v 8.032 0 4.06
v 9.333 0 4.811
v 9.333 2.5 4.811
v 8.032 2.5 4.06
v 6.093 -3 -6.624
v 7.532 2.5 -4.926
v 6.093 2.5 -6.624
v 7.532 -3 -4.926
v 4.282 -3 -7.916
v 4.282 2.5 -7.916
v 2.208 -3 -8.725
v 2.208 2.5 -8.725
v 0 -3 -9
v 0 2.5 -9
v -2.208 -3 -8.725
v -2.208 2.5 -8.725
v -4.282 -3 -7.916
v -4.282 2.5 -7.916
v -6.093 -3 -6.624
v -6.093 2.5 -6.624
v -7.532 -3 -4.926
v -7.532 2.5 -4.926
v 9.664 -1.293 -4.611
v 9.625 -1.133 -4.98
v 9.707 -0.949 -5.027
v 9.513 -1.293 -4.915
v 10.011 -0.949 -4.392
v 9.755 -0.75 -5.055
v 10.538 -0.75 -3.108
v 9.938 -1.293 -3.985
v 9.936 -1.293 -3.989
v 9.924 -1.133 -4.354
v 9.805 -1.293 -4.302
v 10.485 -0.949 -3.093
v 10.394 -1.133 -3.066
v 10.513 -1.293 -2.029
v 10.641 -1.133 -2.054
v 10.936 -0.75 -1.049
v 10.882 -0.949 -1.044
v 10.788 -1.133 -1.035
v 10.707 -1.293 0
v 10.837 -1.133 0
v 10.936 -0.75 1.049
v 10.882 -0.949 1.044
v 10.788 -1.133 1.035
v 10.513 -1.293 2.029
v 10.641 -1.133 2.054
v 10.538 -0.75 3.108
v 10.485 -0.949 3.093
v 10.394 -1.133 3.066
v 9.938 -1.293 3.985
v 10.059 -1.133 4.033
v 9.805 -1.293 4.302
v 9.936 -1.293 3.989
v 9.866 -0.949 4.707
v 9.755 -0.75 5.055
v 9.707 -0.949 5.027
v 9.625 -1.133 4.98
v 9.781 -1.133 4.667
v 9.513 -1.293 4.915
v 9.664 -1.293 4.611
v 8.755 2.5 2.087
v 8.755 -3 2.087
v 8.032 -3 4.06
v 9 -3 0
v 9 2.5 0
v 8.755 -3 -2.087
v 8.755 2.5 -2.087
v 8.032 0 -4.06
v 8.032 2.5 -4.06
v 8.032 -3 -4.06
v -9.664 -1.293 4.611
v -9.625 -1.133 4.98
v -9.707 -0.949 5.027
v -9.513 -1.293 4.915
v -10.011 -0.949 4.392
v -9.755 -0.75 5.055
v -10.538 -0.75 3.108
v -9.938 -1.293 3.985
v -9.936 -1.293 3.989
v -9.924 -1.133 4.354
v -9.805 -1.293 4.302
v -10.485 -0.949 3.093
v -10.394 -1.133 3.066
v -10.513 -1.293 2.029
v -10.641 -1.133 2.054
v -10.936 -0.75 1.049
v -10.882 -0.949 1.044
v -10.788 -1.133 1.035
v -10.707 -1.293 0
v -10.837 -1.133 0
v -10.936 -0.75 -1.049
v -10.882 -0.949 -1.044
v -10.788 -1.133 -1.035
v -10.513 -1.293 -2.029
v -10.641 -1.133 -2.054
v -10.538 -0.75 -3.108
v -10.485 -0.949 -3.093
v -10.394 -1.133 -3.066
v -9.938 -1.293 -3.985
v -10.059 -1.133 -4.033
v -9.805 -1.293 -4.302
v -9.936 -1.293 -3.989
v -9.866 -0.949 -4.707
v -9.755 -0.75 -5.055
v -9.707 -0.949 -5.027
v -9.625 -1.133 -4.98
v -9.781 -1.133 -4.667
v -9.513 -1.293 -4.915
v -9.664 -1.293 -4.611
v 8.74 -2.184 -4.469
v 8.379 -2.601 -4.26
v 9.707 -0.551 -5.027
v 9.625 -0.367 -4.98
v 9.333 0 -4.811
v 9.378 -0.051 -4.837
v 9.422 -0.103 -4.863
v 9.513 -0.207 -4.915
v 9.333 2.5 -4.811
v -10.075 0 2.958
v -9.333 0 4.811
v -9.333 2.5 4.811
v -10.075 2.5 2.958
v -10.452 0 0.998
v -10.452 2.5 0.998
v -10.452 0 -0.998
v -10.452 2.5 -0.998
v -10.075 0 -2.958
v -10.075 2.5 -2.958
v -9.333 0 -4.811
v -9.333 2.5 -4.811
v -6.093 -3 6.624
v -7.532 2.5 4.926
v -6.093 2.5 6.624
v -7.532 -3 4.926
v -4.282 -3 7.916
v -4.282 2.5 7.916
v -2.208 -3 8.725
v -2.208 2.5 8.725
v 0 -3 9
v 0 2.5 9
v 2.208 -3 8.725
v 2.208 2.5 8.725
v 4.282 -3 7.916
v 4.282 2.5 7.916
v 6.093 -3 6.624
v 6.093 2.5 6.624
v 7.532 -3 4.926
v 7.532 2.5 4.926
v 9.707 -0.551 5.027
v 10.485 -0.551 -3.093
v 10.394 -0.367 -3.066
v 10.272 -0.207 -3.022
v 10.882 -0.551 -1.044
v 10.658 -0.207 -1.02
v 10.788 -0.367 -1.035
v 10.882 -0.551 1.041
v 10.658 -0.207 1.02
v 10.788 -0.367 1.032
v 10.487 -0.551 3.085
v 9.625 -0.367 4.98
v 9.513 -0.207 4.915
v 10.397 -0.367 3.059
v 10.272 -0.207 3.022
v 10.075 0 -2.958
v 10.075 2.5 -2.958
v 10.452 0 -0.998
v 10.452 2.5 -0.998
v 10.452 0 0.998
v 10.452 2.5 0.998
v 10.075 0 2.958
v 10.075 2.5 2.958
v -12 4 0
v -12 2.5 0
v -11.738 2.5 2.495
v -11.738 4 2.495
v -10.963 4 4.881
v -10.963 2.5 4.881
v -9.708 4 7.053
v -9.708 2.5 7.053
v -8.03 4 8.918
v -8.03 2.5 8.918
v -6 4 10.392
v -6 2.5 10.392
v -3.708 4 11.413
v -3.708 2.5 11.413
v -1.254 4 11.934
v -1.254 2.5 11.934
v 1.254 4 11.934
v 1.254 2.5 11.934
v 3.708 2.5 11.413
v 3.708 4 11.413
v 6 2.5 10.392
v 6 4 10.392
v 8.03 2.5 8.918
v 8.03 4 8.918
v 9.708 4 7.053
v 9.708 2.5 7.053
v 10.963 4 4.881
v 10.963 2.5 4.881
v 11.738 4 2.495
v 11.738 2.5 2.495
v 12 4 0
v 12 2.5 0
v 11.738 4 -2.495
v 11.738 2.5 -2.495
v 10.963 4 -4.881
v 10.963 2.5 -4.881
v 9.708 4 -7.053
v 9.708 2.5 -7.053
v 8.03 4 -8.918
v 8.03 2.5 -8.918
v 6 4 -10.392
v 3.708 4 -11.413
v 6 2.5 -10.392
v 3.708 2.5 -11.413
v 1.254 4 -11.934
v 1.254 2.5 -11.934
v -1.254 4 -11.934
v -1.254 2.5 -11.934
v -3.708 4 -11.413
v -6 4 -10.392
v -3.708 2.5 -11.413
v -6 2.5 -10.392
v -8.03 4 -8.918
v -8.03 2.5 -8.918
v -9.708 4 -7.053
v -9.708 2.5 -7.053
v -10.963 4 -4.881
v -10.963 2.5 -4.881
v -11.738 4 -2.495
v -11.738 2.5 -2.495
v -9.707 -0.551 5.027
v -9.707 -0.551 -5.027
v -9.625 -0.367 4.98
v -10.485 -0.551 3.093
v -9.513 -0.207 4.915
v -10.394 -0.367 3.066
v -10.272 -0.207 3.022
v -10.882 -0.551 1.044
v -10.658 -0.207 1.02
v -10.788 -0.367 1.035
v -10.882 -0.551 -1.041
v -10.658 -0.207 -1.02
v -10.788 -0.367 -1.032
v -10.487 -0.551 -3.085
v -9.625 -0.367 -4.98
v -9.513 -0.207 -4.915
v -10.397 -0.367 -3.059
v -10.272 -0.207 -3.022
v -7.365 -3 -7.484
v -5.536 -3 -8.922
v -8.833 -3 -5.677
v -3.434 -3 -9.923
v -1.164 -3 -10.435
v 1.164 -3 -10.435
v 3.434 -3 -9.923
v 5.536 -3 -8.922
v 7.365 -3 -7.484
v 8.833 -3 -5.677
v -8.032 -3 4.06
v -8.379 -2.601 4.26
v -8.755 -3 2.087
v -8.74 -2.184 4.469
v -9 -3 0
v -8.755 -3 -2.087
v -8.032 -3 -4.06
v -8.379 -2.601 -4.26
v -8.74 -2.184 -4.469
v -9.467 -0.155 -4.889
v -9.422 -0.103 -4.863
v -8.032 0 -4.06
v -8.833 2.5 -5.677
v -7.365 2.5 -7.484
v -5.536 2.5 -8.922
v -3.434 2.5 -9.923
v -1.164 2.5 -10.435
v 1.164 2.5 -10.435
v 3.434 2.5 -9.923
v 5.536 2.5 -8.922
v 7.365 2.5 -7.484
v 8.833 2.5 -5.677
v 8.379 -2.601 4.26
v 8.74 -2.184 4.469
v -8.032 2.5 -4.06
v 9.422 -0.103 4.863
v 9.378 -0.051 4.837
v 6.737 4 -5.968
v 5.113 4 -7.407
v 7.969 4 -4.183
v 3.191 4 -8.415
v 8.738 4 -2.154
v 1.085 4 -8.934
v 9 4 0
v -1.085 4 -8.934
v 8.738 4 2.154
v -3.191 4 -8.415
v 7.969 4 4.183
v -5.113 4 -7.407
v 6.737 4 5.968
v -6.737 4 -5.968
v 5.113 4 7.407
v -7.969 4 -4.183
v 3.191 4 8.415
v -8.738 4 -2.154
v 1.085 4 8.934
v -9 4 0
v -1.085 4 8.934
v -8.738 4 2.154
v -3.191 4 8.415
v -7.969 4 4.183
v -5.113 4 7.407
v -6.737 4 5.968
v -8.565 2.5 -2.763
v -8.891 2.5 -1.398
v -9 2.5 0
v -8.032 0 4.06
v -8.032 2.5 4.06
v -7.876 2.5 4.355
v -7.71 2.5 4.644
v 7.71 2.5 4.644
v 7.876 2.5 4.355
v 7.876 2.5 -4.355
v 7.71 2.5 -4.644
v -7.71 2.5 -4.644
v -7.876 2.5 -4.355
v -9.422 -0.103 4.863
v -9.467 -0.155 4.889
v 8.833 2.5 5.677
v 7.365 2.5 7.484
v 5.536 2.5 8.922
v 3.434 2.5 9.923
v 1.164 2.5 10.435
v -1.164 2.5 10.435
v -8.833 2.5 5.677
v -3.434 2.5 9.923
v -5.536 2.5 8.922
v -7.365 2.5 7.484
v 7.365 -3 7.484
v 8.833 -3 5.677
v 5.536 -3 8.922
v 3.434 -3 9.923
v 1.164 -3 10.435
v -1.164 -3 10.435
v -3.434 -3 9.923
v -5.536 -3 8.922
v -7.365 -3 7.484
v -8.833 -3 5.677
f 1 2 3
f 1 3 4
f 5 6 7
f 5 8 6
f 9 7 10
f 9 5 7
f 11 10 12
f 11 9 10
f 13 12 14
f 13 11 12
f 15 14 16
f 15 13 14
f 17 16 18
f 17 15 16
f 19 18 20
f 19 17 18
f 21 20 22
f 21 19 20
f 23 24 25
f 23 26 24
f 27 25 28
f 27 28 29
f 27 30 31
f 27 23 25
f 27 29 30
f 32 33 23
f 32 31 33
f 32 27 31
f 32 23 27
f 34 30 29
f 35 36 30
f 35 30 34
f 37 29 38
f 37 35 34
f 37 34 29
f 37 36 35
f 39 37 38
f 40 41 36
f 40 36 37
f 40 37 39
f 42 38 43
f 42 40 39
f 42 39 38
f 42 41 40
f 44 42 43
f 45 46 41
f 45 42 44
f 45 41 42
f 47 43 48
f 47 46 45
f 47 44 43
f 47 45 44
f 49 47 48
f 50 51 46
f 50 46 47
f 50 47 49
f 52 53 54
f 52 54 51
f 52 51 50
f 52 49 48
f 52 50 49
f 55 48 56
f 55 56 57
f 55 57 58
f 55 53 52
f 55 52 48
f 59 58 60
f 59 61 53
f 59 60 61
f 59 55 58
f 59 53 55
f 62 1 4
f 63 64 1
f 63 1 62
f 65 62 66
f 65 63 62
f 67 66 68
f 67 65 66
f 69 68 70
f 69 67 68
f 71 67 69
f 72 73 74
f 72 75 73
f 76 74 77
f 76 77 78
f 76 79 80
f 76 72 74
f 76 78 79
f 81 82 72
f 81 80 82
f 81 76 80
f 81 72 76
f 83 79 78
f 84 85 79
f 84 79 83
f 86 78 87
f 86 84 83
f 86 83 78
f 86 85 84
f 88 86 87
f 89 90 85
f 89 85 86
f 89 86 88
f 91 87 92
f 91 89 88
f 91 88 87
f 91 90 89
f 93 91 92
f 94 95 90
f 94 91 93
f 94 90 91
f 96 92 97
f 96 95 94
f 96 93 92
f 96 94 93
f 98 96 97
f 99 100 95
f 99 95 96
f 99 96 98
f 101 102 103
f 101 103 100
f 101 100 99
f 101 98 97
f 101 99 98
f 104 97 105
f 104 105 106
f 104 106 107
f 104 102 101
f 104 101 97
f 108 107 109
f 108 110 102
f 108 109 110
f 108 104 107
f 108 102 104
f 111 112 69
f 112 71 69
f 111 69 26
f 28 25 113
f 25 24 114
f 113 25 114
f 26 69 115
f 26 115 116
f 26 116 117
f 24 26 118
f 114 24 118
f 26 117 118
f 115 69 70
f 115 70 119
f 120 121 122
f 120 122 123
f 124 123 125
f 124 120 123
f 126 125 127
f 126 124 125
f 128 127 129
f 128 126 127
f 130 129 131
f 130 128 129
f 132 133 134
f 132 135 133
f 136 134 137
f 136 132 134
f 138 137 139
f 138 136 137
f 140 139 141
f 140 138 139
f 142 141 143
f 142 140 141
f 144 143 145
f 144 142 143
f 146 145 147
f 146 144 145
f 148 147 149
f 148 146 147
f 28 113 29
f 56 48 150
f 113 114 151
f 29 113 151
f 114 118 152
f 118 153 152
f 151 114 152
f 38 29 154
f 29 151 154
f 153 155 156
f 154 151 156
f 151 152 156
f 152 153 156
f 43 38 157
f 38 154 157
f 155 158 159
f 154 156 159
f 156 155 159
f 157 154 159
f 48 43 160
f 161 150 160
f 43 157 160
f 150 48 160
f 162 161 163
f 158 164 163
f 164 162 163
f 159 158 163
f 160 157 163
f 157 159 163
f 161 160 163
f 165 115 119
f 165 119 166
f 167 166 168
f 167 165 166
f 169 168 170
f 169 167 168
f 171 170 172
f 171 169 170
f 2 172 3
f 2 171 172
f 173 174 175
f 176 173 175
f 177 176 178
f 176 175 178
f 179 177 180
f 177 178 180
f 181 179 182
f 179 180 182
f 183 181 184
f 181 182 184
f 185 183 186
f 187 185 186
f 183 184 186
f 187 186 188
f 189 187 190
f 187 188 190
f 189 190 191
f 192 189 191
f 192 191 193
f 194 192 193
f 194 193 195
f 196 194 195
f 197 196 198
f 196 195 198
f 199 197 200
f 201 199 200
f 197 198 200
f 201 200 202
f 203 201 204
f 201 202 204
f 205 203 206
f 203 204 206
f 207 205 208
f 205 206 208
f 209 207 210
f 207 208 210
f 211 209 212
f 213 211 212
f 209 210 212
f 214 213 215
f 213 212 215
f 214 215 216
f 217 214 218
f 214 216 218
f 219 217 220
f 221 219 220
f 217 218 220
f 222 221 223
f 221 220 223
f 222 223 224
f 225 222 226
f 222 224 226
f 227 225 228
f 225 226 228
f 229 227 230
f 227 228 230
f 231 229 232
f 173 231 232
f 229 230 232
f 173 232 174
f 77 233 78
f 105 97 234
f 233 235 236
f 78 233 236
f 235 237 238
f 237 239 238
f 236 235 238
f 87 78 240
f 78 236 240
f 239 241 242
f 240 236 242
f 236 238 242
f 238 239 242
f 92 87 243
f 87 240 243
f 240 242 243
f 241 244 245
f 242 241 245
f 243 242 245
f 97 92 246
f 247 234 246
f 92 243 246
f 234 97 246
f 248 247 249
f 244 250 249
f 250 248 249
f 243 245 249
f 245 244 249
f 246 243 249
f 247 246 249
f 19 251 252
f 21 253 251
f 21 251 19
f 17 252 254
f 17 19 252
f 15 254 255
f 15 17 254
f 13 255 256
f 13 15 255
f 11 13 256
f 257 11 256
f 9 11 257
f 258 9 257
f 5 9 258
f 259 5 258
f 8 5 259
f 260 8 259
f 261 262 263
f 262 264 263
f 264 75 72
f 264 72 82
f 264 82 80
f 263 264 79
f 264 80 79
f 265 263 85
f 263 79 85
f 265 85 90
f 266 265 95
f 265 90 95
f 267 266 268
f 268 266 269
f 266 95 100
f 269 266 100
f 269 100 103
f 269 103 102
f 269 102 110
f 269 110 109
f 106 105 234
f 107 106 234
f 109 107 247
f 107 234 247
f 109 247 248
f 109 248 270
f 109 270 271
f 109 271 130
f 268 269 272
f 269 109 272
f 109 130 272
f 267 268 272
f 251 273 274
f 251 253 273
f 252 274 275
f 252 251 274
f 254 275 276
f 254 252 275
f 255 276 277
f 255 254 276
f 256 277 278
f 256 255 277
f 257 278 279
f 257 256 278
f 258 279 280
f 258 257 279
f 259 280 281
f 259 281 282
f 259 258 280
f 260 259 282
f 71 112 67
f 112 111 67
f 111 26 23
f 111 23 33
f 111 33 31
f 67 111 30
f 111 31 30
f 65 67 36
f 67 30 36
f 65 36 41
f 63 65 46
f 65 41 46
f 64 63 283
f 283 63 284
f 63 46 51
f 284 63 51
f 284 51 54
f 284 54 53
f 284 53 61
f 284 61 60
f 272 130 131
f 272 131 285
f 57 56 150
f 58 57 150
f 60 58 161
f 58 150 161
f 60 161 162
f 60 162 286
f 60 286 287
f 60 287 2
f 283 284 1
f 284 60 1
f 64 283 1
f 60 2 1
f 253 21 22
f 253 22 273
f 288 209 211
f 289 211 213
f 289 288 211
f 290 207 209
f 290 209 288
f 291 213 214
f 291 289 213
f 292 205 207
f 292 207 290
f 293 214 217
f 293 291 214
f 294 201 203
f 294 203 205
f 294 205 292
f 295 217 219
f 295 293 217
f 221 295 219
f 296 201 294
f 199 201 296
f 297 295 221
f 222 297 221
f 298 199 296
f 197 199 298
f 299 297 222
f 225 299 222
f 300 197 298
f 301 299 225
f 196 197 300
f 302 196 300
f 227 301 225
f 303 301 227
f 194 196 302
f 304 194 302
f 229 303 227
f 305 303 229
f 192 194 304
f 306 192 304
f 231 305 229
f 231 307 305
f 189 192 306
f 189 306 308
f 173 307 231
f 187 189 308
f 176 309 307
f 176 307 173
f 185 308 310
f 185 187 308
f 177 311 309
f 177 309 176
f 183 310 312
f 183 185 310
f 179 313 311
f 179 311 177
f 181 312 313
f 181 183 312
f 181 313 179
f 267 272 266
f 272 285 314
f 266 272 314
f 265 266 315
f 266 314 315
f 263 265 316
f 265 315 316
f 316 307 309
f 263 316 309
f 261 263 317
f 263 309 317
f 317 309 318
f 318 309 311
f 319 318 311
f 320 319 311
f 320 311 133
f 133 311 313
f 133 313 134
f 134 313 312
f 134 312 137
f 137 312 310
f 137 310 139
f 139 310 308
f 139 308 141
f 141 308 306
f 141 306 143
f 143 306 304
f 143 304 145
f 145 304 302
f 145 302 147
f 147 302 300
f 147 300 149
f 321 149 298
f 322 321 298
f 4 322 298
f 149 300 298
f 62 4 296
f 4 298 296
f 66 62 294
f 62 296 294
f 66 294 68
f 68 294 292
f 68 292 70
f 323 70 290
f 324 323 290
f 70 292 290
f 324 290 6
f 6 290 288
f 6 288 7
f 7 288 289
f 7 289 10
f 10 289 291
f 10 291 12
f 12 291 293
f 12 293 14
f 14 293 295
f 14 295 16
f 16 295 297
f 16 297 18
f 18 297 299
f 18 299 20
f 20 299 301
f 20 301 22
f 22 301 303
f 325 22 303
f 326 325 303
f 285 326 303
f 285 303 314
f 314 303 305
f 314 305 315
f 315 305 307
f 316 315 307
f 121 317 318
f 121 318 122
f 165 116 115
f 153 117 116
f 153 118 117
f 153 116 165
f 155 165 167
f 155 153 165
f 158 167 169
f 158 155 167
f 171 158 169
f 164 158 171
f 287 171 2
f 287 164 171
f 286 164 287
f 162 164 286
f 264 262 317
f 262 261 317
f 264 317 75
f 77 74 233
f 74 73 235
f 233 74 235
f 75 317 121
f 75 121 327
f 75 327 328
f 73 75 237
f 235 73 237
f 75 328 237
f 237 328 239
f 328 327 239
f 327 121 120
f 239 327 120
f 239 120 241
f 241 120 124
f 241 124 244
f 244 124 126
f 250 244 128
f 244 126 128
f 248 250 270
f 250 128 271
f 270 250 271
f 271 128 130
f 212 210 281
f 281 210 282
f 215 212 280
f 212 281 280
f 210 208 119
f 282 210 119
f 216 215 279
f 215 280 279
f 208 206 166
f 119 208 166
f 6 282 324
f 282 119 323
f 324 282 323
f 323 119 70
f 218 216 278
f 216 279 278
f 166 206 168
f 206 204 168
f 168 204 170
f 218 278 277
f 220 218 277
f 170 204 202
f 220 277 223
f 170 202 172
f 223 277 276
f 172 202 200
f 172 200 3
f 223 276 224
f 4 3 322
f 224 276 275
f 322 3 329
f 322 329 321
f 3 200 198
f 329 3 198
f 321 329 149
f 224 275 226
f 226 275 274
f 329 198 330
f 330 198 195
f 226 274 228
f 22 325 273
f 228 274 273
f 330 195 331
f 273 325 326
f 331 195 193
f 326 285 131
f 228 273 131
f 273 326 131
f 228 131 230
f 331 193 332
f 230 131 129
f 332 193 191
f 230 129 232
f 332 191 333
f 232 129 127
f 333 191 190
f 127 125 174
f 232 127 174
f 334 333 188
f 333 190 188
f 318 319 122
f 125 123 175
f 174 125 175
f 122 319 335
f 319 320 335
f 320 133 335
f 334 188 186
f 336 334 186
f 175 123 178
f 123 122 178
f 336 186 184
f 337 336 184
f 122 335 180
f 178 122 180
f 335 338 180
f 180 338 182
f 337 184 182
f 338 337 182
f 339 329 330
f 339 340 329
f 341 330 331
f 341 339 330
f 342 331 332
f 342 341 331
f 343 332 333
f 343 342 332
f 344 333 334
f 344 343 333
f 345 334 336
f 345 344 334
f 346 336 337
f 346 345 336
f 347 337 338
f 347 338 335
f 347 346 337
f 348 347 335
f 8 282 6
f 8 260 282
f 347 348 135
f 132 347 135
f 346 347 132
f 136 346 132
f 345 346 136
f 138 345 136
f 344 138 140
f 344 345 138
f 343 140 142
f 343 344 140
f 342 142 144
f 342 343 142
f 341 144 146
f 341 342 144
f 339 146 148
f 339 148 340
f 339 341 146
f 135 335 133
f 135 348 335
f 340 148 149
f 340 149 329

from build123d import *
from build123d import SkipClean  # not in build123d's __all__

# Parameters (mm, degrees)
F1_DEPTH     = 2.5
F2_R         = 12
F2_R_2       = 9
F3_DEPTH     = 1.5
F5_DEPTH     = 3
F6_SIZE      = 1.99999
F7_SIZE      = 0.49999
F8_T3_ANGLE  = 65.5786890643
F8_T6_ANGLE  = 65.5786890643
F8_T9_ANGLE  = 65.5786890643
F8_T12_ANGLE = 65.5786890643


# Not quite as in the source:
# - a fillet or chamfer that OpenCascade refuses, or shapes differently, is made with other operations: its cross-section is extruded or revolved along the edge and cut away or added
# - a fillet or chamfer is up to 0.001 mm smaller than in the source, because OpenCascade refuses the exact size


with BuildPart() as f1:
    # F0 (on Front) → F1 (new body)
    with BuildSketch(Plane.XZ):
        with BuildLine():
            Line((-8.0321912081, 4.060037487), (-9.3329510623, 4.811031539))
            ThreePointArc((-9.3329510623, 4.811031539), (-10.5, 0), (-9.3329510623, -4.811031539))
            Line((-9.3329510623, -4.811031539), (-8.0321912081, -4.060037487))
            ThreePointArc((-8.0321912081, -4.060037487), (-9, 0), (-8.0321912081, 4.060037487))
        make_face()
    extrude(amount=-F1_DEPTH)



with BuildPart() as f1b:
    # F0 (on Front) → F1, piece 2 (new body)
    with BuildSketch(Plane.XZ):
        with BuildLine():
            ThreePointArc((8.8329510623, 5.6770569427), (0, 10.5), (-8.8329510623, 5.6770569427))
            Line((-8.8329510623, 5.6770569427), (-7.5321912081, 4.9260628908))
            ThreePointArc((-7.5321912081, 4.9260628908), (0, 9), (7.5321912081, 4.9260628908))
            Line((7.5321912081, 4.9260628908), (8.8329510623, 5.6770569427))
        make_face()
    extrude(amount=-F1_DEPTH)


with BuildPart() as f1c:
    # F0 (on Front) → F1, piece 3 (new body)
    with BuildSketch(Plane.XZ):
        with BuildLine():
            Line((8.0321912081, -4.060037487), (9.3329510623, -4.811031539))
            ThreePointArc((9.3329510623, -4.811031539), (10.5, 0), (9.3329510623, 4.811031539))
            Line((9.3329510623, 4.811031539), (8.0321912081, 4.060037487))
            ThreePointArc((8.0321912081, 4.060037487), (9, 0), (8.0321912081, -4.060037487))
        make_face()
    extrude(amount=-F1_DEPTH)


with BuildPart() as f1d:
    # F0 (on Front) → F1, piece 4 (new body)
    with BuildSketch(Plane.XZ):
        with BuildLine():
            Line((-7.5321912081, -4.9260628908), (-8.8329510623, -5.6770569427))
            ThreePointArc((-8.8329510623, -5.6770569427), (0, -10.5), (8.8329510623, -5.6770569427))
            Line((8.8329510623, -5.6770569427), (7.5321912081, -4.9260628908))
            ThreePointArc((7.5321912081, -4.9260628908), (0, -9), (-7.5321912081, -4.9260628908))
        make_face()
    extrude(amount=-F1_DEPTH)


with BuildPart() as f1_1:
    add(f1.part, clean=False)

    add(f1b.part)  # F3 merges F1b

    add(f1c.part)  # F3 merges F1c

    add(f1d.part)  # F3 merges F1d
    # F2 (on face) → F3 (join)
    with BuildSketch(Plane(origin=(0, 2.5, 0), x_dir=(-1, 0, 0), z_dir=(0, 1, 0))):
        Circle(F2_R)
        Circle(F2_R_2, mode=Mode.SUBTRACT)
    extrude(amount=F3_DEPTH)

    # F4 (on face) → F5 (join)
    with BuildSketch(Plane.XZ):
        with BuildLine():
            ThreePointArc((-7.5321912081, 4.9260628908), (0, 9), (7.5321912081, 4.9260628908))
            Line((7.5321912081, 4.9260628908), (8.8329510623, 5.6770569427))
            ThreePointArc((8.8329510623, 5.6770569427), (0, 10.5), (-8.8329510623, 5.6770569427))
            Line((-8.8329510623, 5.6770569427), (-7.5321912081, 4.9260628908))
        make_face()
        with BuildLine():
            Line((8.0321912081, -4.060037487), (9.7664331553, -5.0613025421))
            ThreePointArc((9.7664331553, -5.0613025421), (11, 0), (9.7664331553, 5.0613025421))
            Line((9.7664331553, 5.0613025421), (8.0321912081, 4.060037487))
            ThreePointArc((8.0321912081, 4.060037487), (9, 0), (8.0321912081, -4.060037487))
        make_face()
        with BuildLine():
            Line((-8.0321912081, 4.060037487), (-9.7664331553, 5.0613025421))
            ThreePointArc((-9.7664331553, 5.0613025421), (-11, 0), (-9.7664331553, -5.0613025421))
            Line((-9.7664331553, -5.0613025421), (-8.0321912081, -4.060037487))
            ThreePointArc((-8.0321912081, -4.060037487), (-9, 0), (-8.0321912081, 4.060037487))
        make_face()
        with BuildLine():
            Line((-7.5321912081, -4.9260628908), (-8.8329510623, -5.6770569427))
            ThreePointArc((-8.8329510623, -5.6770569427), (0, -10.5), (8.8329510623, -5.6770569427))
            Line((8.8329510623, -5.6770569427), (7.5321912081, -4.9260628908))
            ThreePointArc((7.5321912081, -4.9260628908), (0, -9), (-7.5321912081, -4.9260628908))
        make_face()
    with SkipClean():  # cleaning this boolean's faces spoils the solid; the shape is the same uncleaned
        extrude(amount=F5_DEPTH)

    # F6 (size 2 in the source; OpenCascade refuses exactly that, so slightly less here)
    f6_edges = [f1_1.edges().sort_by_distance(p)[0] for p in [
        (-11, -3, 0),
        (11, -3, 0),
    ]]
    chamfer(f6_edges, length=F6_SIZE)

    # F7 (size 0.5 in the source; OpenCascade refuses exactly that, so slightly less here)
    f7_edges = [f1_1.edges().sort_by_distance(p)[0] for p in [
        (-11, 0, 0),
        (11, 0, 0),
    ]]
    chamfer(f7_edges, length=F7_SIZE)

    # F8: fillet of radius 1 on 4 edges, made by hand


with BuildPart() as f8_tool1:
    # F8_s2 → F8_t3 (revolve)
    with BuildSketch(Plane(origin=(0, 0, 0), x_dir=(0, 1, 0), z_dir=(0.5415518782, 0, 0.8406673321))):
        with BuildLine():
            ThreePointArc((-0.5857964376, 11), (-0.96847987, 10.9238795325), (-1.2929032188, 10.7071067812))
            Line((-1.2929032188, 10.7071067812), (-1.00001, 11))
            Line((-1.00001, 11), (-0.5857964376, 11))
        make_face()
    revolve(axis=Axis((0, -1.00001, 0), (0, -1, 0)), revolution_arc=F8_T3_ANGLE)


with BuildPart() as f8_tool4:
    # F8_s5 → F8_t6 (revolve)
    with BuildSketch(Plane(origin=(0, 0, 0), x_dir=(0, 1, 0), z_dir=(0.5415518782, 0, 0.8406673321))):
        with BuildLine():
            ThreePointArc((-0.9142035624, 11), (-0.53152013, 10.9238795325), (-0.2070967812, 10.7071067812))
            Line((-0.2070967812, 10.7071067812), (-0.49999, 11))
            Line((-0.49999, 11), (-0.9142035624, 11))
        make_face()
    revolve(axis=Axis((0, -0.49999, 0), (0, -1, 0)), revolution_arc=F8_T6_ANGLE)


with BuildPart() as f8_tool7:
    # F8_s8 → F8_t9 (revolve)
    with BuildSketch(Plane(origin=(0, 0, 0), x_dir=(0, 1, 0), z_dir=(-0.5415518782, 0, -0.8406673321))):
        with BuildLine():
            ThreePointArc((-0.5857964376, 11), (-0.96847987, 10.9238795325), (-1.2929032188, 10.7071067812))
            Line((-1.2929032188, 10.7071067812), (-1.00001, 11))
            Line((-1.00001, 11), (-0.5857964376, 11))
        make_face()
    revolve(axis=Axis((0, -1.00001, 0), (0, -1, 0)), revolution_arc=F8_T9_ANGLE)


with BuildPart() as f8_tool10:
    # F8_s11 → F8_t12 (revolve)
    with BuildSketch(Plane(origin=(0, 0, 0), x_dir=(0, 1, 0), z_dir=(-0.5415518782, 0, -0.8406673321))):
        with BuildLine():
            ThreePointArc((-0.9142035624, 11), (-0.53152013, 10.9238795325), (-0.2070967812, 10.7071067812))
            Line((-0.2070967812, 10.7071067812), (-0.49999, 11))
            Line((-0.49999, 11), (-0.9142035624, 11))
        make_face()
    revolve(axis=Axis((0, -0.49999, 0), (0, -1, 0)), revolution_arc=F8_T12_ANGLE)


with BuildPart() as f1_2:
    add(f1_1.part, clean=False)

    # F8_t13: cut F8_tool1, F8_tool4, F8_tool7, F8_tool10
    add([f8_tool1.part, f8_tool4.part, f8_tool7.part, f8_tool10.part], mode=Mode.SUBTRACT)


solid = f1_2.part
